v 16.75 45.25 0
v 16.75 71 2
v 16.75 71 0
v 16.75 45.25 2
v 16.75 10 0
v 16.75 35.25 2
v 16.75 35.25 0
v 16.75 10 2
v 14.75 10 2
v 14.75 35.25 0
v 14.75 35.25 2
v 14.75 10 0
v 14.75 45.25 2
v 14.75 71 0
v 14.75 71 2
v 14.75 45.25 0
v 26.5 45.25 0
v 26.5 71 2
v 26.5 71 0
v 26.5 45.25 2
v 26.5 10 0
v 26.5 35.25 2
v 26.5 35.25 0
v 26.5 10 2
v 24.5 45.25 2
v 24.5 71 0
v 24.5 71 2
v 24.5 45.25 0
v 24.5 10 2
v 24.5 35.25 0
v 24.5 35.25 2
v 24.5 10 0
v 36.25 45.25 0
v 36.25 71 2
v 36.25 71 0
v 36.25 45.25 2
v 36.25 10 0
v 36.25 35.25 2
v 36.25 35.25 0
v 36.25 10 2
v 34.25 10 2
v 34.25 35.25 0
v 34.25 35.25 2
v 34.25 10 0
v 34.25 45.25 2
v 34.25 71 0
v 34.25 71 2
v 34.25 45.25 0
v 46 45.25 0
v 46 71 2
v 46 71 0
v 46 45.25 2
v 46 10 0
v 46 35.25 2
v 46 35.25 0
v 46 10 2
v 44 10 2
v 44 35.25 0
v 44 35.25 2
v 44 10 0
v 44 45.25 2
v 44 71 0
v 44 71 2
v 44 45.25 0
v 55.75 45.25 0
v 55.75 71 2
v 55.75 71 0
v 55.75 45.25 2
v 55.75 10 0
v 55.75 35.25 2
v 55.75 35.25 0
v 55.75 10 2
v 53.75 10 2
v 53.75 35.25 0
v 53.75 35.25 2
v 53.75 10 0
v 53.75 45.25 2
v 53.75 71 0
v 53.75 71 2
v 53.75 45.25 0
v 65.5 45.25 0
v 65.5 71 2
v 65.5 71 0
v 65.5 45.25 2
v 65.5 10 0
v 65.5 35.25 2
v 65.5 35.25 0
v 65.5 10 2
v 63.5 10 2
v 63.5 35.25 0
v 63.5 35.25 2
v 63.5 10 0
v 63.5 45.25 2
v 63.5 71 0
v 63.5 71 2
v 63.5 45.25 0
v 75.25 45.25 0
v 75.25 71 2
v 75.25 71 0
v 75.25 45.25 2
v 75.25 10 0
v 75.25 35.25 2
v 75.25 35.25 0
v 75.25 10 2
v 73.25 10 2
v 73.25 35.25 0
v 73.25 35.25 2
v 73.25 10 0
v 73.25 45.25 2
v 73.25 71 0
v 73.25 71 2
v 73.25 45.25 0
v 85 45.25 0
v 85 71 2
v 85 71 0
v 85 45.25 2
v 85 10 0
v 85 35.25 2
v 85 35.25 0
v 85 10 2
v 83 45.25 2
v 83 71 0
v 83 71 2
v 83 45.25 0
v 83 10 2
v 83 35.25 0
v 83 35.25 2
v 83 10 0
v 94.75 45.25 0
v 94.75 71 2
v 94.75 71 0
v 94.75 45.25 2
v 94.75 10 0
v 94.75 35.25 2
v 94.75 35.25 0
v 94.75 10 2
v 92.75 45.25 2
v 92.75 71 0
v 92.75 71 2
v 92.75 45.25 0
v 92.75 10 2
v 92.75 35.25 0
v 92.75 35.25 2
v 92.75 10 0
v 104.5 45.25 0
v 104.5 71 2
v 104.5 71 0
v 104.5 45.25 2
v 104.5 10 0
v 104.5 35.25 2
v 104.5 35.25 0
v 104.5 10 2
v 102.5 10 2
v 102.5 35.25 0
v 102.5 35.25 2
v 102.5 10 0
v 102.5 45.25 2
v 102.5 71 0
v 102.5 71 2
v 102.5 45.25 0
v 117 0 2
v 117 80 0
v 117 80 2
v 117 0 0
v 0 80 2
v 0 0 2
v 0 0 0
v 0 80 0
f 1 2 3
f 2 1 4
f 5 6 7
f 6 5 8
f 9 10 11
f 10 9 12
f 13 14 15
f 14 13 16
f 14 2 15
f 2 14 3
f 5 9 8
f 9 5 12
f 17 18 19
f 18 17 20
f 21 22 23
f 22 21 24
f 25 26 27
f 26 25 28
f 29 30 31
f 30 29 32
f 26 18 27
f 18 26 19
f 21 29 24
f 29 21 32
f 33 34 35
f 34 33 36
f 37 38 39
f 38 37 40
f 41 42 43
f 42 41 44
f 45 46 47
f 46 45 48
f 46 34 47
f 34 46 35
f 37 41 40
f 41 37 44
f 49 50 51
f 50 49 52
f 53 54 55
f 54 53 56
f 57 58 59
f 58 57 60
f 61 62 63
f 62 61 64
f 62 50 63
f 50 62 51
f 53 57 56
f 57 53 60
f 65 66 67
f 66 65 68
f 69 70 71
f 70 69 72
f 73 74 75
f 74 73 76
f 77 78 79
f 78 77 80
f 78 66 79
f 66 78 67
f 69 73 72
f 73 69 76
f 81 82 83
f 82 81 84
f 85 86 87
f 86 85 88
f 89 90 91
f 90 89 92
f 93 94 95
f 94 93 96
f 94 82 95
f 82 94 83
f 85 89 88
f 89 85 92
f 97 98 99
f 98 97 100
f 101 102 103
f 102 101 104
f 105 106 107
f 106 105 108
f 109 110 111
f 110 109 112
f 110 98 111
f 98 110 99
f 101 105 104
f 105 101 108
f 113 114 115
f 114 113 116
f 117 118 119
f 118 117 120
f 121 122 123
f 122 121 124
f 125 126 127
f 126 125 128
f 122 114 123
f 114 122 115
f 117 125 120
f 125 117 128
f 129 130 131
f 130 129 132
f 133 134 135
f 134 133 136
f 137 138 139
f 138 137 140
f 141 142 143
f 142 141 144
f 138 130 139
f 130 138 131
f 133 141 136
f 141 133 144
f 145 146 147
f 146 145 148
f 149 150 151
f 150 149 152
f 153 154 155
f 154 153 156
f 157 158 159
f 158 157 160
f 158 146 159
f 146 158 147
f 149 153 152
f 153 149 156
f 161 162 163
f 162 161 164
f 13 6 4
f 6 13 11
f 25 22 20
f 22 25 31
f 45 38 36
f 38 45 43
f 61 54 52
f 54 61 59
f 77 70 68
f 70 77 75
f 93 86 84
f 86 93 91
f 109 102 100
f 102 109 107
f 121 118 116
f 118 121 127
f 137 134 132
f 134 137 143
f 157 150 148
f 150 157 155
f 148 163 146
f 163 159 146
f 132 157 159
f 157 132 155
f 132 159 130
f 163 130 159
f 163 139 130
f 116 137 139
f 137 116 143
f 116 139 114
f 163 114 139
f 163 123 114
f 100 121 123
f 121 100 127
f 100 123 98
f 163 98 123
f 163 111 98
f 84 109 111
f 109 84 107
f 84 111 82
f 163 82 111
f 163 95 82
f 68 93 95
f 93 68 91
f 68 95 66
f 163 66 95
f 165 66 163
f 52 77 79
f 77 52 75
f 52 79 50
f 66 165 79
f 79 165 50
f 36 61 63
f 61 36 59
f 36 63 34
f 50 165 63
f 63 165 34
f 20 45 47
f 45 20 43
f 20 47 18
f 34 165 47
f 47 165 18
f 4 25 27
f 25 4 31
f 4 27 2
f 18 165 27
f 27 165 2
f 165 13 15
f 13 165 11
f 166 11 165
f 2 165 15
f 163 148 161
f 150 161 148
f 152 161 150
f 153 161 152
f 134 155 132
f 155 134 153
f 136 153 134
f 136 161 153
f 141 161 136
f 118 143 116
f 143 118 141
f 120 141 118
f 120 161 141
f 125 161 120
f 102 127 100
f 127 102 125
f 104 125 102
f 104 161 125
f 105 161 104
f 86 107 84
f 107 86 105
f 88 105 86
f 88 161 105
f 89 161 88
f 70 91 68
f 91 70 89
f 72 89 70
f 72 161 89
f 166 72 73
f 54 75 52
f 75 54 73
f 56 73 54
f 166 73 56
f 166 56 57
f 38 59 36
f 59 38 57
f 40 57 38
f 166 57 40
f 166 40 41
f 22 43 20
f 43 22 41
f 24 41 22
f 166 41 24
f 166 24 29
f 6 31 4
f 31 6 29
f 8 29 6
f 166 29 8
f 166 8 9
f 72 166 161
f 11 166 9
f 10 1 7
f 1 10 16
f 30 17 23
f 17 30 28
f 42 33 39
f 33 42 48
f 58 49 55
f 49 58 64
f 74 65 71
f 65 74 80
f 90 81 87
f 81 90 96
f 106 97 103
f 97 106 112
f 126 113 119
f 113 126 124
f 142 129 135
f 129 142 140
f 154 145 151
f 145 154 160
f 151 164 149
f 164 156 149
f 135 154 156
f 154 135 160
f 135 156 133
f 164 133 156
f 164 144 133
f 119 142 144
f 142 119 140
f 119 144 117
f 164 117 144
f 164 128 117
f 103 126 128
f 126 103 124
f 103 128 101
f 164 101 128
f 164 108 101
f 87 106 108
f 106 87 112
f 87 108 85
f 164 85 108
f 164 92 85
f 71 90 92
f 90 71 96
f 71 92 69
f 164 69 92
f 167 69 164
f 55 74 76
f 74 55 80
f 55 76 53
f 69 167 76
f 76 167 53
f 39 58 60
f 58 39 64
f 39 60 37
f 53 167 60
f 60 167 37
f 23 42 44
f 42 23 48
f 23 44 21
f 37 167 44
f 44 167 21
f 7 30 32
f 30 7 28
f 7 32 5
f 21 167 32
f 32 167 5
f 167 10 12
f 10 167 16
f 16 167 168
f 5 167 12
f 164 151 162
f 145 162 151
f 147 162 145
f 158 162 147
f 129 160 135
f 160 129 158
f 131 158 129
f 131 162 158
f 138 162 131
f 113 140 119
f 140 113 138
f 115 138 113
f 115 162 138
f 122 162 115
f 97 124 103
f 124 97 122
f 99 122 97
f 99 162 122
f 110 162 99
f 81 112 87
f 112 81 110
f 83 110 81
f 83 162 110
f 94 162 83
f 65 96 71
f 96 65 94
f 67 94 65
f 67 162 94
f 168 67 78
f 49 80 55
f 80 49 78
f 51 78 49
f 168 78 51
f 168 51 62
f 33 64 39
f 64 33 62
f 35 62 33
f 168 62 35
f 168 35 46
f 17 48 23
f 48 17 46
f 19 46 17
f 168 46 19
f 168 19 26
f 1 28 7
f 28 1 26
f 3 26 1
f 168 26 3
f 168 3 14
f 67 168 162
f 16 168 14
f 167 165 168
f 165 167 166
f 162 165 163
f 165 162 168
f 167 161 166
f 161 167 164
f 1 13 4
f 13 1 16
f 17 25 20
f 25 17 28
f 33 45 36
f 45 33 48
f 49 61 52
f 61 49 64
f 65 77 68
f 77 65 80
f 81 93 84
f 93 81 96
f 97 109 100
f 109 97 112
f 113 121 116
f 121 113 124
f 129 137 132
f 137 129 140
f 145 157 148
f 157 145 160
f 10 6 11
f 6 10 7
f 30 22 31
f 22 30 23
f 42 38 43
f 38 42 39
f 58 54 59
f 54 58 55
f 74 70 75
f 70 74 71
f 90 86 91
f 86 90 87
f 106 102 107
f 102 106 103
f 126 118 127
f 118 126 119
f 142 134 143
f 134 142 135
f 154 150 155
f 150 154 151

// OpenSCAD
//number of fragments
$fn=20;

difference() {
    cube([117,80,2]);

    // air vents
    for(i=[1:10]){
        translate([5+(i*9.75),10,-1]){
            cube([2,61,4]);
        }
    }
}

translate([0,35.25,0]){
    cube([108.50,10,2]);
}
